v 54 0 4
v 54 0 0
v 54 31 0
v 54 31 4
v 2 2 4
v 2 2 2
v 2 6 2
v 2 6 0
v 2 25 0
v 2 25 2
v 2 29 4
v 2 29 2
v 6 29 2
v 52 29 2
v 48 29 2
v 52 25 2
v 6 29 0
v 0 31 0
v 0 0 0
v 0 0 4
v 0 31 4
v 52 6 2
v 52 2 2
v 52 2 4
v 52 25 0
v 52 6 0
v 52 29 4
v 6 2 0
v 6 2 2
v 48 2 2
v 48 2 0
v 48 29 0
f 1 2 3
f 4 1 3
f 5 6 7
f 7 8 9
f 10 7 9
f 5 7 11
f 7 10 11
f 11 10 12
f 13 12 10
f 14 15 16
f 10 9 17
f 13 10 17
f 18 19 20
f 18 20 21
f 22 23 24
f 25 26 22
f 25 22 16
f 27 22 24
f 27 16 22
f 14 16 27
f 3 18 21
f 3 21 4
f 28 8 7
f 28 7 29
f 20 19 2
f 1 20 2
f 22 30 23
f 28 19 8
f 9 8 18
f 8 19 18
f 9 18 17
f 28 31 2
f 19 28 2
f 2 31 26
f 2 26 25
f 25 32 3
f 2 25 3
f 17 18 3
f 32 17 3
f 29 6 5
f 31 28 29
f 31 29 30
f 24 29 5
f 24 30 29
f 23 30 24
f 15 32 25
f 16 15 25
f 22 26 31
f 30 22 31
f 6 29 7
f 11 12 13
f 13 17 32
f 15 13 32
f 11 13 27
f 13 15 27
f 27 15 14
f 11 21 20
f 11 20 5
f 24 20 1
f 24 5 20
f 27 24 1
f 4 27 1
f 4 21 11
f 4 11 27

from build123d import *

# Parameters (mm, degrees)
SKETCH_W     = 54
SKETCH_H     = 31
SKETCH_W_2   = 50
SKETCH_H_2   = 27
PAD_DEPTH    = 4
PAD001_DEPTH = 2
PAD002_DEPTH = 2
PAD003_DEPTH = 2
PAD004_DEPTH = 2


with BuildPart() as part:
    # Sketch → Pad (new body)
    with BuildSketch(Plane.XY):
        with Locations((27, 15.5)):
            Rectangle(SKETCH_W, SKETCH_H)
        with Locations((27, 15.5)):
            Rectangle(SKETCH_W_2, SKETCH_H_2, mode=Mode.SUBTRACT)
    extrude(amount=PAD_DEPTH)

    # Sketch001 → Pad001 (join)
    with BuildSketch(Plane.XY):
        Polygon((2, 6), (6, 2), (2, 2), align=None)
    extrude(amount=PAD001_DEPTH)

    # Sketch002 → Pad002 (join)
    with BuildSketch(Plane.XY):
        Polygon((48, 29), (52, 25), (52, 29), align=None)
    extrude(amount=PAD002_DEPTH)

    # Sketch003 → Pad003 (join)
    with BuildSketch(Plane.XY):
        Polygon((2, 25), (6, 29), (2, 29), align=None)
    extrude(amount=PAD003_DEPTH)

    # Sketch004 → Pad004 (join)
    with BuildSketch(Plane.XY):
        Polygon((52, 6), (48, 2), (52, 2), align=None)
    extrude(amount=PAD004_DEPTH)


solid = part.part
